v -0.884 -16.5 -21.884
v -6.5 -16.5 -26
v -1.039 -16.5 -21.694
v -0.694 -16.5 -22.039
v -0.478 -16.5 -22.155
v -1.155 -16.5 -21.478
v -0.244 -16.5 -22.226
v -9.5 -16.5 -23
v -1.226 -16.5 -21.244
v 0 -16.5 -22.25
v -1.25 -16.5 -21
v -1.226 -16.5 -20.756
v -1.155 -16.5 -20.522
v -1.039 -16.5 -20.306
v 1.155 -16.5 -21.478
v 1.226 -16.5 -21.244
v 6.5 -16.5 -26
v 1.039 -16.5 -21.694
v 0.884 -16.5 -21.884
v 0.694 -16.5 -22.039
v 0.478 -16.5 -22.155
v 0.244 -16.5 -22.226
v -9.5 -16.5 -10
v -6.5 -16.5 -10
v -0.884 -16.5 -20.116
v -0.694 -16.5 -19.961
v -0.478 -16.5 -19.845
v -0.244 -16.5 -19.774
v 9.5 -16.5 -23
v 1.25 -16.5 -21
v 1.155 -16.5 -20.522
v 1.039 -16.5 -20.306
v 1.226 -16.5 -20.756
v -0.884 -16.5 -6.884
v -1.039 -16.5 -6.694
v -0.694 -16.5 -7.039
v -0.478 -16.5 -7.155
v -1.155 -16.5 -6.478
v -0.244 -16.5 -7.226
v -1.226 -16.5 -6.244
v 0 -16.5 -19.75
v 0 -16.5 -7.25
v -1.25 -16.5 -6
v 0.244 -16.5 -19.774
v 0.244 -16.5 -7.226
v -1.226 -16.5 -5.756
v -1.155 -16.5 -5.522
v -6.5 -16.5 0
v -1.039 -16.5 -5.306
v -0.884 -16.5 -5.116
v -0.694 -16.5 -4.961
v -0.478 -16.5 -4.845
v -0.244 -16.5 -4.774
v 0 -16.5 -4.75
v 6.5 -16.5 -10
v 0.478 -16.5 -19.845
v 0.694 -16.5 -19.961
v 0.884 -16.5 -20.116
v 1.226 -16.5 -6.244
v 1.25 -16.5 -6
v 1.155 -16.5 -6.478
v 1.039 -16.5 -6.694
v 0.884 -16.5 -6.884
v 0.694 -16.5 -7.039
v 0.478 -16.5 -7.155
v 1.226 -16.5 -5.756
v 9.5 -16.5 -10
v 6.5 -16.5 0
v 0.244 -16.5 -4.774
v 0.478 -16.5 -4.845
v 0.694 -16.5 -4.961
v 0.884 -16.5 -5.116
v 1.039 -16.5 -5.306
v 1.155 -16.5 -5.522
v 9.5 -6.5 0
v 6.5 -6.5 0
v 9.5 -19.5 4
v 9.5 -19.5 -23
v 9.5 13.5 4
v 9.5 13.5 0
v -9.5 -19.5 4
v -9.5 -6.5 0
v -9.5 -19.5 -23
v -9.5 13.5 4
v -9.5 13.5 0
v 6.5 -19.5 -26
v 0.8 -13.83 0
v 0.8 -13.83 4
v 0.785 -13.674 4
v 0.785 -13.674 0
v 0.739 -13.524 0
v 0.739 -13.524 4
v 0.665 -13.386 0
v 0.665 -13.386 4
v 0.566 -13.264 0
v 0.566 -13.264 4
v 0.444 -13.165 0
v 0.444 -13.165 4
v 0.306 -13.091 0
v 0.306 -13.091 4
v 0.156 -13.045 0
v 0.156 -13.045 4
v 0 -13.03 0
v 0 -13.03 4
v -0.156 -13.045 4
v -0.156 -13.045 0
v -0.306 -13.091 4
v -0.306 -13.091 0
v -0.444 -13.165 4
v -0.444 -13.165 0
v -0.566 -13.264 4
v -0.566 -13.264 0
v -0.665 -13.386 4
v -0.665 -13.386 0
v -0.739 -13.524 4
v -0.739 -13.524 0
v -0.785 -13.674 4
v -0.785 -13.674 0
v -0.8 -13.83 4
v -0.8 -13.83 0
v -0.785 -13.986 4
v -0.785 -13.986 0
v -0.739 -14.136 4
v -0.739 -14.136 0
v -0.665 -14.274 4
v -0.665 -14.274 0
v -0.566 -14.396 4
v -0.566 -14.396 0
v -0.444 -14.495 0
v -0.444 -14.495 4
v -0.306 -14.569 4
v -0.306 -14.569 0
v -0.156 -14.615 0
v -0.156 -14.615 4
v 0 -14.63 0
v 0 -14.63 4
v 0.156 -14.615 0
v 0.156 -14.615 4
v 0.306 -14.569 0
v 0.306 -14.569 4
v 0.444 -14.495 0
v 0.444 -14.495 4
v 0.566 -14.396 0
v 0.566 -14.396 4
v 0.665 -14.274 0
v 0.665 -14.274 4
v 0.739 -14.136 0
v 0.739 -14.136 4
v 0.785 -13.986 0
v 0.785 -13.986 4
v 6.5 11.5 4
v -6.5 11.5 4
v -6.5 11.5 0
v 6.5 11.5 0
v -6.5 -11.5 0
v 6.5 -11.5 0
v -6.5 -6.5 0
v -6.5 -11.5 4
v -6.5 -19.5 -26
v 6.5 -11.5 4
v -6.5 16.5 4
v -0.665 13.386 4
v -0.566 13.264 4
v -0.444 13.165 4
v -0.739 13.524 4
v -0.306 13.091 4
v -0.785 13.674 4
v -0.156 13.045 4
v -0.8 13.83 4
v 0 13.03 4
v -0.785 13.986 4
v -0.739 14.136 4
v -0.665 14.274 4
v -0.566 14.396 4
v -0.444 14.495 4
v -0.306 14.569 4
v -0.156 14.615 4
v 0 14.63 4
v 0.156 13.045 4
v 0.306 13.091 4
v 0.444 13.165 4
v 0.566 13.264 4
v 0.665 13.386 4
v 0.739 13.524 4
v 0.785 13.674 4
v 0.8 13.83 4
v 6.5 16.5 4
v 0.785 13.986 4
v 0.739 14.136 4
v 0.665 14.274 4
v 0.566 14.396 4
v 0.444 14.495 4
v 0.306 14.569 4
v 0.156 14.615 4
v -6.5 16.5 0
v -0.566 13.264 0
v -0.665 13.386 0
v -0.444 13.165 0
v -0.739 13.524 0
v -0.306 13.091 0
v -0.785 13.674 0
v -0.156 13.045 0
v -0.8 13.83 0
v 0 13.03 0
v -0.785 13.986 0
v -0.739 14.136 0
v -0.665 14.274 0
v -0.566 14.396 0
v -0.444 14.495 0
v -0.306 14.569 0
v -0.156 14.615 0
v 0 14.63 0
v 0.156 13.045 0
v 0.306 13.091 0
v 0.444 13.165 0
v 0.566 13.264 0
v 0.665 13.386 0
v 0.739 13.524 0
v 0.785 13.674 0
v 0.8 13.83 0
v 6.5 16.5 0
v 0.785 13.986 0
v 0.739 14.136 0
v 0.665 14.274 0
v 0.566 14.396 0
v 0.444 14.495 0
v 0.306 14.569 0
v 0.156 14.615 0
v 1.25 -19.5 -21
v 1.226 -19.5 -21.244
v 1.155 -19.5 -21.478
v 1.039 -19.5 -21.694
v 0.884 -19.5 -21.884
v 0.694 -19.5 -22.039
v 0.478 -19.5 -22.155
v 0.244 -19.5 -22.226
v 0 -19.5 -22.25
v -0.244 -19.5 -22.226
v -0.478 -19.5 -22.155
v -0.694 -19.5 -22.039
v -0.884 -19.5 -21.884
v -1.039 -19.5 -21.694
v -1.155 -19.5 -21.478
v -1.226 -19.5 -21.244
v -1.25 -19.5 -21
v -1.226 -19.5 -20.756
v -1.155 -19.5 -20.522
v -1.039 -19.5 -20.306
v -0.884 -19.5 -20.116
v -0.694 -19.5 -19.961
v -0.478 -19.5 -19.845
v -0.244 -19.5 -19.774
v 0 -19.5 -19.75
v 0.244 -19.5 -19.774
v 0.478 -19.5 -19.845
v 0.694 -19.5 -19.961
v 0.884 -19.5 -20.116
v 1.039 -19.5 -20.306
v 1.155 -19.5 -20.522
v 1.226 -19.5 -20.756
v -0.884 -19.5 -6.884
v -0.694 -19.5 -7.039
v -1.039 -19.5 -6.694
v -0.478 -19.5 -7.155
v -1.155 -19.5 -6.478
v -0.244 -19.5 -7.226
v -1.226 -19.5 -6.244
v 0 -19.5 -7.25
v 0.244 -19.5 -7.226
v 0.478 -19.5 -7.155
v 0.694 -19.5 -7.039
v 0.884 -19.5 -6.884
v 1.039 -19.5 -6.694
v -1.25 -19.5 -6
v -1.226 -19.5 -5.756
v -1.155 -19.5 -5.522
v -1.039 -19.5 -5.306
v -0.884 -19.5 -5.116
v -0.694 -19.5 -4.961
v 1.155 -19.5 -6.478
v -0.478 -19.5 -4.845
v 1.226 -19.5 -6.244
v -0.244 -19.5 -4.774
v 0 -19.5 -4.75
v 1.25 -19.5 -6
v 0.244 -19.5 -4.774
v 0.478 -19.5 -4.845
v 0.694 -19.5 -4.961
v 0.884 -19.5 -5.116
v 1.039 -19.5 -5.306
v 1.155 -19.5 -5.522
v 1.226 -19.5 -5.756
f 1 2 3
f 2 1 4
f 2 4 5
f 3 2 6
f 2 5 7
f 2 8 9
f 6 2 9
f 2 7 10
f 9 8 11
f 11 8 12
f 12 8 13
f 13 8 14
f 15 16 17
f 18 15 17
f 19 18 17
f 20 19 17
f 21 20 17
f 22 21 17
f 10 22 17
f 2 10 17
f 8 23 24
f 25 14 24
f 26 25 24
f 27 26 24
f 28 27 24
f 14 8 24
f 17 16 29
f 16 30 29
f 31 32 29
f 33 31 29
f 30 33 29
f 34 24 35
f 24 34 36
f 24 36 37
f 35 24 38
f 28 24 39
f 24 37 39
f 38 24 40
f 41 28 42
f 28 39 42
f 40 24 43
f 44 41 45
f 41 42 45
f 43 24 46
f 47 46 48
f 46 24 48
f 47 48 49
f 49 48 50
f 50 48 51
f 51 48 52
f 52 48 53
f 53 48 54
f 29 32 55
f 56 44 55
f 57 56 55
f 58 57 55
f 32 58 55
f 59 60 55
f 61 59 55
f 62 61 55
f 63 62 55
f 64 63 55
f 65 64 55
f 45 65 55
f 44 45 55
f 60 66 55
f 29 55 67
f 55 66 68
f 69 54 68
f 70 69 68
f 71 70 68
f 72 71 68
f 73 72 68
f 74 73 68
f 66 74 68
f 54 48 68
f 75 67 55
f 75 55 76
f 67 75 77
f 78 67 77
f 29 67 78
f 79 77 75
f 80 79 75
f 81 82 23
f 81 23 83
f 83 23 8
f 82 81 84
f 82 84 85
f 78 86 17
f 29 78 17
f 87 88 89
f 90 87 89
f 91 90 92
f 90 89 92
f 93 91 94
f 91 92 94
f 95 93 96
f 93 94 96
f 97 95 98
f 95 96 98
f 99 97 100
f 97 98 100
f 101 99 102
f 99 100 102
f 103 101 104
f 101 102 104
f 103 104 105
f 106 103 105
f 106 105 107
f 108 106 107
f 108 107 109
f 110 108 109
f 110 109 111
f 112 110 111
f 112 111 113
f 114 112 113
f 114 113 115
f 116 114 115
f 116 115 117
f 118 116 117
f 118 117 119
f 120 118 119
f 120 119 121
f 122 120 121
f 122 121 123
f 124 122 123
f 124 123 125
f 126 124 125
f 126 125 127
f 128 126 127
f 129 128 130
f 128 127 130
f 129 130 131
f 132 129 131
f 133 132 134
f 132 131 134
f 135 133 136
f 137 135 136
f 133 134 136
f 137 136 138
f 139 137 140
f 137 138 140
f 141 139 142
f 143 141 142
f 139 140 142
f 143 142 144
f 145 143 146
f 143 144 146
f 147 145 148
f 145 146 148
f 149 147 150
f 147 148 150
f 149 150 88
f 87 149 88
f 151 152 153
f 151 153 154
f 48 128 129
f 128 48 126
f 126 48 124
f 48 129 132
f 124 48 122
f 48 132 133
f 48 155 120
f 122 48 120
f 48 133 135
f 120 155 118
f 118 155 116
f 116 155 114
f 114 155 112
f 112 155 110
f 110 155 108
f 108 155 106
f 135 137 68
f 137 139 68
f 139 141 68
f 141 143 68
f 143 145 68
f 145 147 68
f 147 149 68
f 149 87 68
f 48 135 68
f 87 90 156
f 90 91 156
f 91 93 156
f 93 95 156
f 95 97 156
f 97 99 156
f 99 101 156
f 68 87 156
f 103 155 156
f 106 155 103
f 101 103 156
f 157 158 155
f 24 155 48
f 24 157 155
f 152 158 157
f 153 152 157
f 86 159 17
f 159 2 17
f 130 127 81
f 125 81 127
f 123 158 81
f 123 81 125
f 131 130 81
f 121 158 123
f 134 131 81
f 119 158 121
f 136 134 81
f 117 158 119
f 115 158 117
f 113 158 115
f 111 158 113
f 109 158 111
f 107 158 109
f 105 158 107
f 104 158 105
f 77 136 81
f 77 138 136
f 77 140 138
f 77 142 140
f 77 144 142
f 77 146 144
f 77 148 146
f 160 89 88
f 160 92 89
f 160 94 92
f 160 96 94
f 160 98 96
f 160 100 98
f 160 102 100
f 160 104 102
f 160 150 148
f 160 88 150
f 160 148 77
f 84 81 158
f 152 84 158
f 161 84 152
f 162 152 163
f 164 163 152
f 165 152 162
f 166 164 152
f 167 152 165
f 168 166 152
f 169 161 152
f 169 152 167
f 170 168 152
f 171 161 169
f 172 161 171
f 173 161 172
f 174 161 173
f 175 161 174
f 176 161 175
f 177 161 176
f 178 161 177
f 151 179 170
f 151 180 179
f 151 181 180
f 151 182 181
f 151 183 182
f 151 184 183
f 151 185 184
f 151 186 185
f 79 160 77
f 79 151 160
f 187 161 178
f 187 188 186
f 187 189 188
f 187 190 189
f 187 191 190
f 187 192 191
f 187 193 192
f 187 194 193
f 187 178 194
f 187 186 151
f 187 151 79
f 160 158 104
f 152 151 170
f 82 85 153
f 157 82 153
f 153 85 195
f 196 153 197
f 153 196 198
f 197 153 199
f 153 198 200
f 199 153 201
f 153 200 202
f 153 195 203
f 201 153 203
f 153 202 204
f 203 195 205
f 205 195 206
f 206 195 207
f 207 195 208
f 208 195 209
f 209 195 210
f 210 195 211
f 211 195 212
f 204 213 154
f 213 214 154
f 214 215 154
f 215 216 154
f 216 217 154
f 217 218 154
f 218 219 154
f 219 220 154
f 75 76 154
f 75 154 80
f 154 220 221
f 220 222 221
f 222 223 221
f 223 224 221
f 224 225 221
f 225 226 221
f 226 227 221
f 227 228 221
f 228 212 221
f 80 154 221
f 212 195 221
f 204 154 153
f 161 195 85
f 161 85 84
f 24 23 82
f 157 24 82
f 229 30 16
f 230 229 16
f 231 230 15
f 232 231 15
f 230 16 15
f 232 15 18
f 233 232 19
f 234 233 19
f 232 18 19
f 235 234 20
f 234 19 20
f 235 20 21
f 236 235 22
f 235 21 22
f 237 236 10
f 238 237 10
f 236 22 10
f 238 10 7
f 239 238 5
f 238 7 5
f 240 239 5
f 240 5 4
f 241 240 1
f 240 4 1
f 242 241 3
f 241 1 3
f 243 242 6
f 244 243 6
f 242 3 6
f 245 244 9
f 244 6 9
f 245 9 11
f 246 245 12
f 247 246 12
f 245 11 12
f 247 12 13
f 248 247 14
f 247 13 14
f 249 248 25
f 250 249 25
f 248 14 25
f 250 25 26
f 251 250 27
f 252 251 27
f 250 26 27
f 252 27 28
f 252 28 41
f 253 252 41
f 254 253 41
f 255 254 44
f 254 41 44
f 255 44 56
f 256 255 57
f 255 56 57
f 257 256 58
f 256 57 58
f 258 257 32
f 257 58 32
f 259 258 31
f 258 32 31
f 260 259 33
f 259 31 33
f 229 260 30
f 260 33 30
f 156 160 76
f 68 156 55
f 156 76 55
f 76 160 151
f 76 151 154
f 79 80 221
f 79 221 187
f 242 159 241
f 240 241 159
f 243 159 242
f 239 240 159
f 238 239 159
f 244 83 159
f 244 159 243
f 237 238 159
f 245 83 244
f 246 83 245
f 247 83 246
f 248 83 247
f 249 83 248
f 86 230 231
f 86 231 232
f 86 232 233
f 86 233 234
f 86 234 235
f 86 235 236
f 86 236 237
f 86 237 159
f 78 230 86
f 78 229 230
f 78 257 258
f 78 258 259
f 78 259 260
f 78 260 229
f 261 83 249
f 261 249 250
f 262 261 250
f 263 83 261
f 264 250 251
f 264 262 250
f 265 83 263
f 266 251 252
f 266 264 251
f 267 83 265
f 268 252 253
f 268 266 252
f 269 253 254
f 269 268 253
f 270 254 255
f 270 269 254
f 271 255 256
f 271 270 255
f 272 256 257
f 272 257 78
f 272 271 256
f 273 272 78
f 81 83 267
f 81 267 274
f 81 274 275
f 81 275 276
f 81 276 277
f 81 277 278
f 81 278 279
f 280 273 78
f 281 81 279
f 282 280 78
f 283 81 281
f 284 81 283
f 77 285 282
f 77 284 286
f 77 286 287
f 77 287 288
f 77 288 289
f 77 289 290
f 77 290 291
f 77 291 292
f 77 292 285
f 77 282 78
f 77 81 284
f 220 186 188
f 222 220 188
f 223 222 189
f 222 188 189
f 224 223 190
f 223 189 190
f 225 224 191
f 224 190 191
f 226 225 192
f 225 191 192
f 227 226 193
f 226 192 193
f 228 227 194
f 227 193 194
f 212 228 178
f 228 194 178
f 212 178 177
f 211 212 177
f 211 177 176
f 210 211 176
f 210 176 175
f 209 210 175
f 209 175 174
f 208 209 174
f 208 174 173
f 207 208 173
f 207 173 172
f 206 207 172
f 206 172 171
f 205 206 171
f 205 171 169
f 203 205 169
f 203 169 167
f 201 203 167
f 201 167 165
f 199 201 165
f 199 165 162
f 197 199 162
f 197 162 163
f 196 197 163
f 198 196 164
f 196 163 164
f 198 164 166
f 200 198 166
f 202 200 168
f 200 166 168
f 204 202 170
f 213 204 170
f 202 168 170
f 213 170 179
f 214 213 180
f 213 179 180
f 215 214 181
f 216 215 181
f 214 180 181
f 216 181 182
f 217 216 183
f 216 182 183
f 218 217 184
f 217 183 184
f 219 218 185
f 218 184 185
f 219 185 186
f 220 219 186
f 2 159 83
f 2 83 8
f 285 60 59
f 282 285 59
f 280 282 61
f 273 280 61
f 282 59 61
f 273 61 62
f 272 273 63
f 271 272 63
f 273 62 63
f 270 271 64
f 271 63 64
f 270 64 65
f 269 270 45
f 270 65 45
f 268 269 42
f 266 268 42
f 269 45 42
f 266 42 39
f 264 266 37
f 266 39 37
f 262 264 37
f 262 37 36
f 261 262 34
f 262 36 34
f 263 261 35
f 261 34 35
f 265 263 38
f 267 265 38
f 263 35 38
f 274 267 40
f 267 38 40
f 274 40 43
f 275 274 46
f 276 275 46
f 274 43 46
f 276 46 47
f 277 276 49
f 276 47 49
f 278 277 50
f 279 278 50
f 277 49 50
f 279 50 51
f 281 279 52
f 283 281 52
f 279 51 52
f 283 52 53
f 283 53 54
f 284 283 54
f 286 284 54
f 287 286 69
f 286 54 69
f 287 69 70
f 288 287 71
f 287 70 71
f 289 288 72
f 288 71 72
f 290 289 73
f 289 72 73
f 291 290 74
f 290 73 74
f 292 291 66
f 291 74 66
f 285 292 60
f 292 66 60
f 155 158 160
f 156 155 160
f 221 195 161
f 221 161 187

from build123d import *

# Parameters (mm, degrees)
CROQUIS1_W              = 19
CROQUIS1_H              = 33
SALIENTE_EXTRUIR1_DEPTH = 4
CROQUIS2_R              = 0.8
CROQUIS2_W              = 13
CROQUIS2_H              = 23
CORTAR_EXTRUIR1_DEPTH   = 5
CHAFL_N1_SIZE           = 3
CROQUIS3_W              = 19
CROQUIS3_H              = 3
SALIENTE_EXTRUIR2_DEPTH = 30
SALIENTE_EXTRUIR3_DEPTH = 3
SALIENTE_EXTRUIR4_DEPTH = 3
CHAFL_N2_SIZE           = 3
CROQUIS9_R              = 1.25
CORTAR_EXTRUIR2_DEPTH   = 3


with BuildPart() as part:
    # Croquis1 → Saliente-Extruir1 (new body)
    with BuildSketch(Plane.XY):
        Rectangle(CROQUIS1_W, CROQUIS1_H)
    extrude(amount=SALIENTE_EXTRUIR1_DEPTH)

    # Croquis2 → Cortar-Extruir1 (cut)
    with BuildSketch(Plane.XY.offset(4)):
        with Locations((0, 13.83)):
            Circle(CROQUIS2_R)
        with Locations((0, -13.83)):
            Circle(CROQUIS2_R)
        Rectangle(CROQUIS2_W, CROQUIS2_H)
    extrude(amount=-CORTAR_EXTRUIR1_DEPTH, mode=Mode.SUBTRACT)

    # Chaflán1
    chafl_n1_edges = [part.edges().sort_by_distance(p)[0] for p in [
        (-9.5, 16.5, 2),
        (9.5, 16.5, 2),
    ]]
    chamfer(chafl_n1_edges, length=CHAFL_N1_SIZE)

    # Croquis3 → Saliente-Extruir2 (add)
    with BuildSketch(Plane.XY.offset(4)):
        with Locations((0, -18)):
            Rectangle(CROQUIS3_W, CROQUIS3_H)
    extrude(amount=-SALIENTE_EXTRUIR2_DEPTH)

    # Croquis7 → Saliente-Extruir3 (add)
    with BuildSketch(Plane(origin=(9.5, 0, 0), x_dir=(0, 0, -1), z_dir=(1, 0, 0))):
        Polygon((0, -6.5), (0, -16.5), (10, -16.5), align=None)
    extrude(amount=-SALIENTE_EXTRUIR3_DEPTH)

    # Croquis8 → Saliente-Extruir4 (add)
    with BuildSketch(Plane.ZY.offset(9.5)):
        Polygon((0, -16.5), (-10, -16.5), (0, -6.5), align=None)
    extrude(amount=-SALIENTE_EXTRUIR4_DEPTH)

    # Chaflán2
    chafl_n2_edges = [part.edges().sort_by_distance(p)[0] for p in [
        (-9.5, -18, -26),
        (9.5, -18, -26),
    ]]
    chamfer(chafl_n2_edges, length=CHAFL_N2_SIZE)

    # Croquis9 → Cortar-Extruir2 (cut)
    with BuildSketch(Plane(origin=(0, -16.5, 0), x_dir=(1, 0, 0), z_dir=(0, 1, 0))):
        with Locations((0, 6)):
            Circle(CROQUIS9_R)
        with Locations((0, 21)):
            Circle(CROQUIS9_R)
    extrude(amount=-CORTAR_EXTRUIR2_DEPTH, mode=Mode.SUBTRACT)


solid = part.part
